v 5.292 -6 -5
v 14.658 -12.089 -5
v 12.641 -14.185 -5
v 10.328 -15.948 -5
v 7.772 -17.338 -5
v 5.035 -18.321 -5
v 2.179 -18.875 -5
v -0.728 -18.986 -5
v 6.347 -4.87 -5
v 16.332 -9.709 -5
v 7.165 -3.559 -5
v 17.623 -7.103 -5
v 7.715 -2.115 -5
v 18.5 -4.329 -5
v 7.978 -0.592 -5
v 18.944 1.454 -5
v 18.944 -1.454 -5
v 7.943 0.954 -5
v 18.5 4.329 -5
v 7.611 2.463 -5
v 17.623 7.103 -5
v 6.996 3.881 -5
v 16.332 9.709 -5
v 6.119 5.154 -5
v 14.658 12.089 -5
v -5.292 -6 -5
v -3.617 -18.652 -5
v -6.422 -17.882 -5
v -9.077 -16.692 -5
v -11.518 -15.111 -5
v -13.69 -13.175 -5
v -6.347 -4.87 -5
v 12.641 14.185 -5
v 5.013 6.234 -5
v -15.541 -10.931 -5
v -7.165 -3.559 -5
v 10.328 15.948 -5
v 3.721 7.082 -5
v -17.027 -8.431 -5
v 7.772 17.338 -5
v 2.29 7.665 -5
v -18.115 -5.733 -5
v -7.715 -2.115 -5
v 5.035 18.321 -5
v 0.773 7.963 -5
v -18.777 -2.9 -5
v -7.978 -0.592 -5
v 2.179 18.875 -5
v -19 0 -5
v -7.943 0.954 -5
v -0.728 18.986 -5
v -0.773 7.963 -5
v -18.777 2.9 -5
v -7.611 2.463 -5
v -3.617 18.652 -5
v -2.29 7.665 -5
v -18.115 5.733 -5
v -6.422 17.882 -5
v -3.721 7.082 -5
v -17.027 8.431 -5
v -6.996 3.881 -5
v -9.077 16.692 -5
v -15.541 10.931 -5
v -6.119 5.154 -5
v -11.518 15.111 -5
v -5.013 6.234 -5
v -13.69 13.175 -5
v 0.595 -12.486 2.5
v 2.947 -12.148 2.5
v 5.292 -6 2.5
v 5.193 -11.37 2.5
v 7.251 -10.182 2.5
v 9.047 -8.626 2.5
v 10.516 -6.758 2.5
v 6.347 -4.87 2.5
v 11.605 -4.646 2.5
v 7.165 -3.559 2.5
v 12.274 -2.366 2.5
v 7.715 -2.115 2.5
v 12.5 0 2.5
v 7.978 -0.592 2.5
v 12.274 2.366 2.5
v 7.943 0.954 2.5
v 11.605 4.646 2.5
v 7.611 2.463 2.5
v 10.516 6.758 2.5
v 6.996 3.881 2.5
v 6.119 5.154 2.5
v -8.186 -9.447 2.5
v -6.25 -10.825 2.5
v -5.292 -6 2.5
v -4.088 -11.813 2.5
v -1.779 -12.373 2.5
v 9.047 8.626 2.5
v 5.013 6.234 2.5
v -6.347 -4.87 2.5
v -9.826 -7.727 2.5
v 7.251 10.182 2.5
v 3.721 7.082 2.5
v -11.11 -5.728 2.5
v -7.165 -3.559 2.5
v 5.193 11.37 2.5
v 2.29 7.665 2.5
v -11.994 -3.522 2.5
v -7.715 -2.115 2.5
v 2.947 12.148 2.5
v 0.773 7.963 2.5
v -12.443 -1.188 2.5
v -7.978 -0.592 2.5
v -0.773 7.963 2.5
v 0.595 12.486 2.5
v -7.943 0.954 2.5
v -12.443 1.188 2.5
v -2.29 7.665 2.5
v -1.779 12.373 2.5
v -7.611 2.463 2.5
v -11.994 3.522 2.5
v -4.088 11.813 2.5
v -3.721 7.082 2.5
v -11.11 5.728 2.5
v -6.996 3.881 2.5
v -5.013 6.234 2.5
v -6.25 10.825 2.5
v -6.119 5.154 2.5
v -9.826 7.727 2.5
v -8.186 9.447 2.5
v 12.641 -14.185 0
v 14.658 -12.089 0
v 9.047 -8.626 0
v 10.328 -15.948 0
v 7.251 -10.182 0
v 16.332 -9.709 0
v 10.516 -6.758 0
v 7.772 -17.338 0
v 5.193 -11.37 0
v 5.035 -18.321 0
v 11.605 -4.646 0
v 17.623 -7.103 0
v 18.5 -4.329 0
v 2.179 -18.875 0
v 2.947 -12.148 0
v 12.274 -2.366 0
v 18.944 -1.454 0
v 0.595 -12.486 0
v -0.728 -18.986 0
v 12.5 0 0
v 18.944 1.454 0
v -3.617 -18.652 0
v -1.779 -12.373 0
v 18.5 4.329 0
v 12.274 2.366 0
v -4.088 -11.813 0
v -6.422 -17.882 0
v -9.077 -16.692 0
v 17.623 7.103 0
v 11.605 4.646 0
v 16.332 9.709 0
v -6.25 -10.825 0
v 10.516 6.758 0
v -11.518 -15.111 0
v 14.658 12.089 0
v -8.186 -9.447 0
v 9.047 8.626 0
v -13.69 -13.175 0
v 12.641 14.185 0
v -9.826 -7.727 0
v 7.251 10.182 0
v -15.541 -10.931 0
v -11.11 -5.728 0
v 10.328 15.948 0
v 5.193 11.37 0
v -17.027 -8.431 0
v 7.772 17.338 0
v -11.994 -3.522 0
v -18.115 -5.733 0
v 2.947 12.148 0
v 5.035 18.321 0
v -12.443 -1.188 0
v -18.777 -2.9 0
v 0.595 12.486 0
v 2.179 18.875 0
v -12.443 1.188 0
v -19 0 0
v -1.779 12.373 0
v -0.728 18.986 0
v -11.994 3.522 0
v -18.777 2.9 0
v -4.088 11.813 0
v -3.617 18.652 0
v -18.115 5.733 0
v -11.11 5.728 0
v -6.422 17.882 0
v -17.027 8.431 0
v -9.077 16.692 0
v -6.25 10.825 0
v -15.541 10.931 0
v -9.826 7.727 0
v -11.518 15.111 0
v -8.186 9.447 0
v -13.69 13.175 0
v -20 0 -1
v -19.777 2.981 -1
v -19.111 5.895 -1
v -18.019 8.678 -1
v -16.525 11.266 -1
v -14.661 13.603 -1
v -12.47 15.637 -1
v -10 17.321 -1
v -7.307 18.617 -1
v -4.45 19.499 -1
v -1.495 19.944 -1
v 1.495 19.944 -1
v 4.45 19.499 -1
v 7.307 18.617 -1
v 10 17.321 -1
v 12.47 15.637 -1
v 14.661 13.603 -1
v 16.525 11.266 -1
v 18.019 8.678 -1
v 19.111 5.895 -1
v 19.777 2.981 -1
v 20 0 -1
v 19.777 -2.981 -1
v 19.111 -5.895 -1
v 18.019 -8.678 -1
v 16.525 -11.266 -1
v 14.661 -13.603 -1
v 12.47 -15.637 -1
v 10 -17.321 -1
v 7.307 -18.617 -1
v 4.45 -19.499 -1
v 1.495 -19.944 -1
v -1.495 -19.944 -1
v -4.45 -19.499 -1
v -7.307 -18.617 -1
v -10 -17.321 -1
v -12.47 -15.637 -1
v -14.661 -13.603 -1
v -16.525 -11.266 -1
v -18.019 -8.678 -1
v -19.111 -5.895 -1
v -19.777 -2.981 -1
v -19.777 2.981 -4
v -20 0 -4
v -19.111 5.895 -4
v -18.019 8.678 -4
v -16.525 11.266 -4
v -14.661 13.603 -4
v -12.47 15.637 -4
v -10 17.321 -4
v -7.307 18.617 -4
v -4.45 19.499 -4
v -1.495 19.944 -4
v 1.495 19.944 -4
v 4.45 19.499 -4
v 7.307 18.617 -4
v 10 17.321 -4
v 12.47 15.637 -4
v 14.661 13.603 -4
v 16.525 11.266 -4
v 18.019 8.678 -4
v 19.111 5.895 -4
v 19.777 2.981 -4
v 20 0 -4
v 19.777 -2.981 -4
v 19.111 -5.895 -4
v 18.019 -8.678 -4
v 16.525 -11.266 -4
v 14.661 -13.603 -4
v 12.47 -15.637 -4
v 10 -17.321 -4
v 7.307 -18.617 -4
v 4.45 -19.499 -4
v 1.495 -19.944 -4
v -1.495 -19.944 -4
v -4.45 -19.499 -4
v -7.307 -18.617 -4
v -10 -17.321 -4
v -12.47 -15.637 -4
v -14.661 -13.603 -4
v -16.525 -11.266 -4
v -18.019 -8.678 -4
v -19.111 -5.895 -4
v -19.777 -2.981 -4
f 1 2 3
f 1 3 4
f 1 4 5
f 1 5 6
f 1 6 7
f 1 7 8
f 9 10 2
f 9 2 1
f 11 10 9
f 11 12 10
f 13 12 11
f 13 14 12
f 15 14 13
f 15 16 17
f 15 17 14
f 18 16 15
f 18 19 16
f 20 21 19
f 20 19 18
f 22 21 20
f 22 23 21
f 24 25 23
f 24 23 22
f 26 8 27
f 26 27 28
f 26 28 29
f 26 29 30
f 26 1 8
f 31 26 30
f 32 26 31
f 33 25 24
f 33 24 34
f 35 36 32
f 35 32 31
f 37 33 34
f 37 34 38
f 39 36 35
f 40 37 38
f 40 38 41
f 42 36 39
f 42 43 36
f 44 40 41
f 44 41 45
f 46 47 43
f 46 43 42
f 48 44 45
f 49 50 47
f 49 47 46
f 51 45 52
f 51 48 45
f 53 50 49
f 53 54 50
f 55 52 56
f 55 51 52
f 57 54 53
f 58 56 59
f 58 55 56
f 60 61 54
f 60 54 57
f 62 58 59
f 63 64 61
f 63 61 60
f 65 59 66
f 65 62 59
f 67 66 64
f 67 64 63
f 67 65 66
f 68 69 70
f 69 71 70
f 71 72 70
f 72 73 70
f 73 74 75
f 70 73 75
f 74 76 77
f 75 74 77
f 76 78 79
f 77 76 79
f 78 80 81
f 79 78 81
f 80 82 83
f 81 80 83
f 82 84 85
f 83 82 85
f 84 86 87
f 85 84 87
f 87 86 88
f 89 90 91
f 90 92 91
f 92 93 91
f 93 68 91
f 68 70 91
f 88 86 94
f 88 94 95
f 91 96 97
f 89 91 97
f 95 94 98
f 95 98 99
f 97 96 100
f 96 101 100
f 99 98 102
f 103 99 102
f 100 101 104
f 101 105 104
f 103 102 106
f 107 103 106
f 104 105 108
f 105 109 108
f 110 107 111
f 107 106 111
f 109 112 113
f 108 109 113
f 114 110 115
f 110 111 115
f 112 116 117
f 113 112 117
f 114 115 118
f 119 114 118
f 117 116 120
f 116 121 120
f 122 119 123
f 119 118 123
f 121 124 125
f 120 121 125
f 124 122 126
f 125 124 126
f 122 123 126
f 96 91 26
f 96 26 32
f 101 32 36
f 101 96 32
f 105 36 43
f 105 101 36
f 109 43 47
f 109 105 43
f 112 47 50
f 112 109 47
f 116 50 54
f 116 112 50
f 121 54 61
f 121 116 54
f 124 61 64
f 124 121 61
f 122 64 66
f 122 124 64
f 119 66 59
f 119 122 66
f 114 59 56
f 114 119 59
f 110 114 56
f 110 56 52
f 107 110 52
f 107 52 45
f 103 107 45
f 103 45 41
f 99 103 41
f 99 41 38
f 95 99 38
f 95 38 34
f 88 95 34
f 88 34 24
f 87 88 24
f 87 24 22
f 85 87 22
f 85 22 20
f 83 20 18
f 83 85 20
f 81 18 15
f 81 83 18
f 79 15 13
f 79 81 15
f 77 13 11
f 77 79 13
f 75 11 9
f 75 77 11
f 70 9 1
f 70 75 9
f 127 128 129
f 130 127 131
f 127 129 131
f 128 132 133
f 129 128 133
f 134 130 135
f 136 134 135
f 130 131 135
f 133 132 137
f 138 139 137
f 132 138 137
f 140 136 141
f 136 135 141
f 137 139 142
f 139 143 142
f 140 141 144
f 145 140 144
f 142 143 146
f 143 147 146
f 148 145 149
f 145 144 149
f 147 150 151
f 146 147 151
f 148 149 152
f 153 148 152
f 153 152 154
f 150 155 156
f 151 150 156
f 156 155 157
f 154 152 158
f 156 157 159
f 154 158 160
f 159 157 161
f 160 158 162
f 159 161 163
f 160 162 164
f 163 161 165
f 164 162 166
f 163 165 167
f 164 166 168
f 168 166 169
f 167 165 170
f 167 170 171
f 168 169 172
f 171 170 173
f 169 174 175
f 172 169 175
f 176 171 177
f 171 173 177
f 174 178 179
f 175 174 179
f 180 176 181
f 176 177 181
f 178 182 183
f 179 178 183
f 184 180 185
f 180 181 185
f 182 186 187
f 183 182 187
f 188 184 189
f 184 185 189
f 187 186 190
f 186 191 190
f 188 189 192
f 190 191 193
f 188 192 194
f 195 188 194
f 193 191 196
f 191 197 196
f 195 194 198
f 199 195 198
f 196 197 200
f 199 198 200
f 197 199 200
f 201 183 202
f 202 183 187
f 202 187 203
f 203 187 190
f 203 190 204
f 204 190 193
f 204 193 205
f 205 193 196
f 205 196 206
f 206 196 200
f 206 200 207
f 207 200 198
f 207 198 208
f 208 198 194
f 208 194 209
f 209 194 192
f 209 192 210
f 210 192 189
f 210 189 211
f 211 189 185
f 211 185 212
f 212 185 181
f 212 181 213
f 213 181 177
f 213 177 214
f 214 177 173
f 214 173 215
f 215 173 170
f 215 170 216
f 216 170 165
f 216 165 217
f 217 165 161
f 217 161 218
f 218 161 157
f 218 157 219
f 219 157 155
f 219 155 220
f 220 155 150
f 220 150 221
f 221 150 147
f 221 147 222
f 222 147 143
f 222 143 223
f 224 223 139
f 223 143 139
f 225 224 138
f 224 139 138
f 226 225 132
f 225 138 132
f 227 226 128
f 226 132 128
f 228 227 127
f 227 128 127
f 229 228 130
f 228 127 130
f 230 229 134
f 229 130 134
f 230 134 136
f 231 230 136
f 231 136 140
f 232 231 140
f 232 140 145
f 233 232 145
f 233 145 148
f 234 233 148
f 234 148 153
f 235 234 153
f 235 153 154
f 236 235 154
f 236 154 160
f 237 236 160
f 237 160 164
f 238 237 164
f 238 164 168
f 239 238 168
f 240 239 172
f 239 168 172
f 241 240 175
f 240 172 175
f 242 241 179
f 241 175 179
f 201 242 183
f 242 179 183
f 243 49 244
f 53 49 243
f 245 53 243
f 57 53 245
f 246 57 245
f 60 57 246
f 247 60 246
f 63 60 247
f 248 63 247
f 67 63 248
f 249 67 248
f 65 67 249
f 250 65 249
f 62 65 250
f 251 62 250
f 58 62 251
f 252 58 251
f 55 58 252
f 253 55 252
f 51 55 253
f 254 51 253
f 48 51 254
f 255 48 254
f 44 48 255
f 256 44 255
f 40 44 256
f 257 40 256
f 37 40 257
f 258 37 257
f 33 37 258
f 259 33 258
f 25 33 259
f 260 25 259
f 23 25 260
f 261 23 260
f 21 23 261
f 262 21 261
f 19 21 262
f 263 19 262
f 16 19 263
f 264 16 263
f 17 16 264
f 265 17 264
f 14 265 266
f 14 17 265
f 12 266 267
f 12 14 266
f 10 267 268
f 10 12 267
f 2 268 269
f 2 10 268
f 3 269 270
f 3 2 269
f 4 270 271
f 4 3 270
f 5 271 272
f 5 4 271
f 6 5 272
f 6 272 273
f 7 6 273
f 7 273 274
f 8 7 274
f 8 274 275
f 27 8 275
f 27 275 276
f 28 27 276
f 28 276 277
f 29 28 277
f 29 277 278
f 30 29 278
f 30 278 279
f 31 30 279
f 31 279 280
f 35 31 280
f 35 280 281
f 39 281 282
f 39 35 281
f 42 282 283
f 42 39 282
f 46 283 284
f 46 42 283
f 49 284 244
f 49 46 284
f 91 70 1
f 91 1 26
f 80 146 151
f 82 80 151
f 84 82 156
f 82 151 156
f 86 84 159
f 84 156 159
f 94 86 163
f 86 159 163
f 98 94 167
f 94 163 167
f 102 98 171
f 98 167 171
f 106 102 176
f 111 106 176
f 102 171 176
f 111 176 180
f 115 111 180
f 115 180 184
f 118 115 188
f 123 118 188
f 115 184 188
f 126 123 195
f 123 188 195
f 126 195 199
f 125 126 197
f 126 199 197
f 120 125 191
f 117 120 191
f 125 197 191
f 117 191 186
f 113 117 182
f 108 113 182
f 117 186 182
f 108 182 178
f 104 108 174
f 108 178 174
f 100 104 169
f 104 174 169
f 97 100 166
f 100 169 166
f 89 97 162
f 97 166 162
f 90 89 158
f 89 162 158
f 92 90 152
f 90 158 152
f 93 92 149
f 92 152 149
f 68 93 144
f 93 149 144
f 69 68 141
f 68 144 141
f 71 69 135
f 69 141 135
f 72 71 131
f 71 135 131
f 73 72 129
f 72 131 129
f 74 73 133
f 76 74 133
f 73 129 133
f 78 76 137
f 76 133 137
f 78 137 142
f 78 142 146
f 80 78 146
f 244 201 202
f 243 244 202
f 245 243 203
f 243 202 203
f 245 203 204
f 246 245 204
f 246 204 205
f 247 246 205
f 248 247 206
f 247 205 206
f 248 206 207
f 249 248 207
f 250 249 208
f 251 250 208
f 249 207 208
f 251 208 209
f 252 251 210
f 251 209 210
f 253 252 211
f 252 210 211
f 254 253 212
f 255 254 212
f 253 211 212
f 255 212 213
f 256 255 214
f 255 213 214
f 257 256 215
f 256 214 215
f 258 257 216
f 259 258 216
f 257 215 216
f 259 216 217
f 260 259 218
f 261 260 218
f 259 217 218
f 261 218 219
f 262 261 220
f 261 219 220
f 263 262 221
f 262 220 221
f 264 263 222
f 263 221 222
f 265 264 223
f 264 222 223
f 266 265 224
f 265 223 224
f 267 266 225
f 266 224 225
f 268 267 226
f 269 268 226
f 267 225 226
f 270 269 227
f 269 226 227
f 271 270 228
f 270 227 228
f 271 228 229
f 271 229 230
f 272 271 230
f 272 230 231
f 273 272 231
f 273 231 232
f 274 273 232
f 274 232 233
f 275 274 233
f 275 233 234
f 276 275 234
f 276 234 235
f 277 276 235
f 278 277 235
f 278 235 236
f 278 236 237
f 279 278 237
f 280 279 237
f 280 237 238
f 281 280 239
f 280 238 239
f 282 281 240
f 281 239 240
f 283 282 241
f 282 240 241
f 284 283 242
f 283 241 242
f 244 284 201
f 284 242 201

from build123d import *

# Parameters (mm, degrees)
SKETCH1_R           = 12.5
SKETCH1_R_2         = 8
BOSS_EXTRUDE1_DEPTH = 2.5
SKETCH3_R           = 20
SKETCH3_R_2         = 8
BOSS_EXTRUDE3_DEPTH = 5
CHAMFER2_SIZE       = 1
SKETCH4_W           = 11
SKETCH4_H           = 7.5
BOSS_EXTRUDE4_DEPTH = 3


with BuildPart() as part:
    # Sketch1 → Boss-Extrude1 (new body)
    with BuildSketch(Plane.XY):
        Circle(SKETCH1_R)
        Circle(SKETCH1_R_2, mode=Mode.SUBTRACT)
    extrude(amount=BOSS_EXTRUDE1_DEPTH)

    # Sketch3 → Boss-Extrude3 (add)
    with BuildSketch(Plane(origin=(0, 0, 0), x_dir=(-1, 0, 0), z_dir=(0, 0, -1))):
        Circle(SKETCH3_R)
        Circle(SKETCH3_R_2, mode=Mode.SUBTRACT)
    extrude(amount=BOSS_EXTRUDE3_DEPTH)

    # Chamfer2
    chamfer2_edges = [part.edges().sort_by_distance(p)[0] for p in [
        (20, 0, 0),
        (20, 0, -5),
    ]]
    chamfer(chamfer2_edges, length=CHAMFER2_SIZE)

    # Sketch4 → Boss-Extrude4 (add)
    with BuildSketch(Plane(origin=(0, -6, 0), x_dir=(-1, 0, 0), z_dir=(0, 1, 0))):
        with Locations((0, -1.25)):
            Rectangle(SKETCH4_W, SKETCH4_H)
    extrude(amount=-BOSS_EXTRUDE4_DEPTH)


solid = part.part
